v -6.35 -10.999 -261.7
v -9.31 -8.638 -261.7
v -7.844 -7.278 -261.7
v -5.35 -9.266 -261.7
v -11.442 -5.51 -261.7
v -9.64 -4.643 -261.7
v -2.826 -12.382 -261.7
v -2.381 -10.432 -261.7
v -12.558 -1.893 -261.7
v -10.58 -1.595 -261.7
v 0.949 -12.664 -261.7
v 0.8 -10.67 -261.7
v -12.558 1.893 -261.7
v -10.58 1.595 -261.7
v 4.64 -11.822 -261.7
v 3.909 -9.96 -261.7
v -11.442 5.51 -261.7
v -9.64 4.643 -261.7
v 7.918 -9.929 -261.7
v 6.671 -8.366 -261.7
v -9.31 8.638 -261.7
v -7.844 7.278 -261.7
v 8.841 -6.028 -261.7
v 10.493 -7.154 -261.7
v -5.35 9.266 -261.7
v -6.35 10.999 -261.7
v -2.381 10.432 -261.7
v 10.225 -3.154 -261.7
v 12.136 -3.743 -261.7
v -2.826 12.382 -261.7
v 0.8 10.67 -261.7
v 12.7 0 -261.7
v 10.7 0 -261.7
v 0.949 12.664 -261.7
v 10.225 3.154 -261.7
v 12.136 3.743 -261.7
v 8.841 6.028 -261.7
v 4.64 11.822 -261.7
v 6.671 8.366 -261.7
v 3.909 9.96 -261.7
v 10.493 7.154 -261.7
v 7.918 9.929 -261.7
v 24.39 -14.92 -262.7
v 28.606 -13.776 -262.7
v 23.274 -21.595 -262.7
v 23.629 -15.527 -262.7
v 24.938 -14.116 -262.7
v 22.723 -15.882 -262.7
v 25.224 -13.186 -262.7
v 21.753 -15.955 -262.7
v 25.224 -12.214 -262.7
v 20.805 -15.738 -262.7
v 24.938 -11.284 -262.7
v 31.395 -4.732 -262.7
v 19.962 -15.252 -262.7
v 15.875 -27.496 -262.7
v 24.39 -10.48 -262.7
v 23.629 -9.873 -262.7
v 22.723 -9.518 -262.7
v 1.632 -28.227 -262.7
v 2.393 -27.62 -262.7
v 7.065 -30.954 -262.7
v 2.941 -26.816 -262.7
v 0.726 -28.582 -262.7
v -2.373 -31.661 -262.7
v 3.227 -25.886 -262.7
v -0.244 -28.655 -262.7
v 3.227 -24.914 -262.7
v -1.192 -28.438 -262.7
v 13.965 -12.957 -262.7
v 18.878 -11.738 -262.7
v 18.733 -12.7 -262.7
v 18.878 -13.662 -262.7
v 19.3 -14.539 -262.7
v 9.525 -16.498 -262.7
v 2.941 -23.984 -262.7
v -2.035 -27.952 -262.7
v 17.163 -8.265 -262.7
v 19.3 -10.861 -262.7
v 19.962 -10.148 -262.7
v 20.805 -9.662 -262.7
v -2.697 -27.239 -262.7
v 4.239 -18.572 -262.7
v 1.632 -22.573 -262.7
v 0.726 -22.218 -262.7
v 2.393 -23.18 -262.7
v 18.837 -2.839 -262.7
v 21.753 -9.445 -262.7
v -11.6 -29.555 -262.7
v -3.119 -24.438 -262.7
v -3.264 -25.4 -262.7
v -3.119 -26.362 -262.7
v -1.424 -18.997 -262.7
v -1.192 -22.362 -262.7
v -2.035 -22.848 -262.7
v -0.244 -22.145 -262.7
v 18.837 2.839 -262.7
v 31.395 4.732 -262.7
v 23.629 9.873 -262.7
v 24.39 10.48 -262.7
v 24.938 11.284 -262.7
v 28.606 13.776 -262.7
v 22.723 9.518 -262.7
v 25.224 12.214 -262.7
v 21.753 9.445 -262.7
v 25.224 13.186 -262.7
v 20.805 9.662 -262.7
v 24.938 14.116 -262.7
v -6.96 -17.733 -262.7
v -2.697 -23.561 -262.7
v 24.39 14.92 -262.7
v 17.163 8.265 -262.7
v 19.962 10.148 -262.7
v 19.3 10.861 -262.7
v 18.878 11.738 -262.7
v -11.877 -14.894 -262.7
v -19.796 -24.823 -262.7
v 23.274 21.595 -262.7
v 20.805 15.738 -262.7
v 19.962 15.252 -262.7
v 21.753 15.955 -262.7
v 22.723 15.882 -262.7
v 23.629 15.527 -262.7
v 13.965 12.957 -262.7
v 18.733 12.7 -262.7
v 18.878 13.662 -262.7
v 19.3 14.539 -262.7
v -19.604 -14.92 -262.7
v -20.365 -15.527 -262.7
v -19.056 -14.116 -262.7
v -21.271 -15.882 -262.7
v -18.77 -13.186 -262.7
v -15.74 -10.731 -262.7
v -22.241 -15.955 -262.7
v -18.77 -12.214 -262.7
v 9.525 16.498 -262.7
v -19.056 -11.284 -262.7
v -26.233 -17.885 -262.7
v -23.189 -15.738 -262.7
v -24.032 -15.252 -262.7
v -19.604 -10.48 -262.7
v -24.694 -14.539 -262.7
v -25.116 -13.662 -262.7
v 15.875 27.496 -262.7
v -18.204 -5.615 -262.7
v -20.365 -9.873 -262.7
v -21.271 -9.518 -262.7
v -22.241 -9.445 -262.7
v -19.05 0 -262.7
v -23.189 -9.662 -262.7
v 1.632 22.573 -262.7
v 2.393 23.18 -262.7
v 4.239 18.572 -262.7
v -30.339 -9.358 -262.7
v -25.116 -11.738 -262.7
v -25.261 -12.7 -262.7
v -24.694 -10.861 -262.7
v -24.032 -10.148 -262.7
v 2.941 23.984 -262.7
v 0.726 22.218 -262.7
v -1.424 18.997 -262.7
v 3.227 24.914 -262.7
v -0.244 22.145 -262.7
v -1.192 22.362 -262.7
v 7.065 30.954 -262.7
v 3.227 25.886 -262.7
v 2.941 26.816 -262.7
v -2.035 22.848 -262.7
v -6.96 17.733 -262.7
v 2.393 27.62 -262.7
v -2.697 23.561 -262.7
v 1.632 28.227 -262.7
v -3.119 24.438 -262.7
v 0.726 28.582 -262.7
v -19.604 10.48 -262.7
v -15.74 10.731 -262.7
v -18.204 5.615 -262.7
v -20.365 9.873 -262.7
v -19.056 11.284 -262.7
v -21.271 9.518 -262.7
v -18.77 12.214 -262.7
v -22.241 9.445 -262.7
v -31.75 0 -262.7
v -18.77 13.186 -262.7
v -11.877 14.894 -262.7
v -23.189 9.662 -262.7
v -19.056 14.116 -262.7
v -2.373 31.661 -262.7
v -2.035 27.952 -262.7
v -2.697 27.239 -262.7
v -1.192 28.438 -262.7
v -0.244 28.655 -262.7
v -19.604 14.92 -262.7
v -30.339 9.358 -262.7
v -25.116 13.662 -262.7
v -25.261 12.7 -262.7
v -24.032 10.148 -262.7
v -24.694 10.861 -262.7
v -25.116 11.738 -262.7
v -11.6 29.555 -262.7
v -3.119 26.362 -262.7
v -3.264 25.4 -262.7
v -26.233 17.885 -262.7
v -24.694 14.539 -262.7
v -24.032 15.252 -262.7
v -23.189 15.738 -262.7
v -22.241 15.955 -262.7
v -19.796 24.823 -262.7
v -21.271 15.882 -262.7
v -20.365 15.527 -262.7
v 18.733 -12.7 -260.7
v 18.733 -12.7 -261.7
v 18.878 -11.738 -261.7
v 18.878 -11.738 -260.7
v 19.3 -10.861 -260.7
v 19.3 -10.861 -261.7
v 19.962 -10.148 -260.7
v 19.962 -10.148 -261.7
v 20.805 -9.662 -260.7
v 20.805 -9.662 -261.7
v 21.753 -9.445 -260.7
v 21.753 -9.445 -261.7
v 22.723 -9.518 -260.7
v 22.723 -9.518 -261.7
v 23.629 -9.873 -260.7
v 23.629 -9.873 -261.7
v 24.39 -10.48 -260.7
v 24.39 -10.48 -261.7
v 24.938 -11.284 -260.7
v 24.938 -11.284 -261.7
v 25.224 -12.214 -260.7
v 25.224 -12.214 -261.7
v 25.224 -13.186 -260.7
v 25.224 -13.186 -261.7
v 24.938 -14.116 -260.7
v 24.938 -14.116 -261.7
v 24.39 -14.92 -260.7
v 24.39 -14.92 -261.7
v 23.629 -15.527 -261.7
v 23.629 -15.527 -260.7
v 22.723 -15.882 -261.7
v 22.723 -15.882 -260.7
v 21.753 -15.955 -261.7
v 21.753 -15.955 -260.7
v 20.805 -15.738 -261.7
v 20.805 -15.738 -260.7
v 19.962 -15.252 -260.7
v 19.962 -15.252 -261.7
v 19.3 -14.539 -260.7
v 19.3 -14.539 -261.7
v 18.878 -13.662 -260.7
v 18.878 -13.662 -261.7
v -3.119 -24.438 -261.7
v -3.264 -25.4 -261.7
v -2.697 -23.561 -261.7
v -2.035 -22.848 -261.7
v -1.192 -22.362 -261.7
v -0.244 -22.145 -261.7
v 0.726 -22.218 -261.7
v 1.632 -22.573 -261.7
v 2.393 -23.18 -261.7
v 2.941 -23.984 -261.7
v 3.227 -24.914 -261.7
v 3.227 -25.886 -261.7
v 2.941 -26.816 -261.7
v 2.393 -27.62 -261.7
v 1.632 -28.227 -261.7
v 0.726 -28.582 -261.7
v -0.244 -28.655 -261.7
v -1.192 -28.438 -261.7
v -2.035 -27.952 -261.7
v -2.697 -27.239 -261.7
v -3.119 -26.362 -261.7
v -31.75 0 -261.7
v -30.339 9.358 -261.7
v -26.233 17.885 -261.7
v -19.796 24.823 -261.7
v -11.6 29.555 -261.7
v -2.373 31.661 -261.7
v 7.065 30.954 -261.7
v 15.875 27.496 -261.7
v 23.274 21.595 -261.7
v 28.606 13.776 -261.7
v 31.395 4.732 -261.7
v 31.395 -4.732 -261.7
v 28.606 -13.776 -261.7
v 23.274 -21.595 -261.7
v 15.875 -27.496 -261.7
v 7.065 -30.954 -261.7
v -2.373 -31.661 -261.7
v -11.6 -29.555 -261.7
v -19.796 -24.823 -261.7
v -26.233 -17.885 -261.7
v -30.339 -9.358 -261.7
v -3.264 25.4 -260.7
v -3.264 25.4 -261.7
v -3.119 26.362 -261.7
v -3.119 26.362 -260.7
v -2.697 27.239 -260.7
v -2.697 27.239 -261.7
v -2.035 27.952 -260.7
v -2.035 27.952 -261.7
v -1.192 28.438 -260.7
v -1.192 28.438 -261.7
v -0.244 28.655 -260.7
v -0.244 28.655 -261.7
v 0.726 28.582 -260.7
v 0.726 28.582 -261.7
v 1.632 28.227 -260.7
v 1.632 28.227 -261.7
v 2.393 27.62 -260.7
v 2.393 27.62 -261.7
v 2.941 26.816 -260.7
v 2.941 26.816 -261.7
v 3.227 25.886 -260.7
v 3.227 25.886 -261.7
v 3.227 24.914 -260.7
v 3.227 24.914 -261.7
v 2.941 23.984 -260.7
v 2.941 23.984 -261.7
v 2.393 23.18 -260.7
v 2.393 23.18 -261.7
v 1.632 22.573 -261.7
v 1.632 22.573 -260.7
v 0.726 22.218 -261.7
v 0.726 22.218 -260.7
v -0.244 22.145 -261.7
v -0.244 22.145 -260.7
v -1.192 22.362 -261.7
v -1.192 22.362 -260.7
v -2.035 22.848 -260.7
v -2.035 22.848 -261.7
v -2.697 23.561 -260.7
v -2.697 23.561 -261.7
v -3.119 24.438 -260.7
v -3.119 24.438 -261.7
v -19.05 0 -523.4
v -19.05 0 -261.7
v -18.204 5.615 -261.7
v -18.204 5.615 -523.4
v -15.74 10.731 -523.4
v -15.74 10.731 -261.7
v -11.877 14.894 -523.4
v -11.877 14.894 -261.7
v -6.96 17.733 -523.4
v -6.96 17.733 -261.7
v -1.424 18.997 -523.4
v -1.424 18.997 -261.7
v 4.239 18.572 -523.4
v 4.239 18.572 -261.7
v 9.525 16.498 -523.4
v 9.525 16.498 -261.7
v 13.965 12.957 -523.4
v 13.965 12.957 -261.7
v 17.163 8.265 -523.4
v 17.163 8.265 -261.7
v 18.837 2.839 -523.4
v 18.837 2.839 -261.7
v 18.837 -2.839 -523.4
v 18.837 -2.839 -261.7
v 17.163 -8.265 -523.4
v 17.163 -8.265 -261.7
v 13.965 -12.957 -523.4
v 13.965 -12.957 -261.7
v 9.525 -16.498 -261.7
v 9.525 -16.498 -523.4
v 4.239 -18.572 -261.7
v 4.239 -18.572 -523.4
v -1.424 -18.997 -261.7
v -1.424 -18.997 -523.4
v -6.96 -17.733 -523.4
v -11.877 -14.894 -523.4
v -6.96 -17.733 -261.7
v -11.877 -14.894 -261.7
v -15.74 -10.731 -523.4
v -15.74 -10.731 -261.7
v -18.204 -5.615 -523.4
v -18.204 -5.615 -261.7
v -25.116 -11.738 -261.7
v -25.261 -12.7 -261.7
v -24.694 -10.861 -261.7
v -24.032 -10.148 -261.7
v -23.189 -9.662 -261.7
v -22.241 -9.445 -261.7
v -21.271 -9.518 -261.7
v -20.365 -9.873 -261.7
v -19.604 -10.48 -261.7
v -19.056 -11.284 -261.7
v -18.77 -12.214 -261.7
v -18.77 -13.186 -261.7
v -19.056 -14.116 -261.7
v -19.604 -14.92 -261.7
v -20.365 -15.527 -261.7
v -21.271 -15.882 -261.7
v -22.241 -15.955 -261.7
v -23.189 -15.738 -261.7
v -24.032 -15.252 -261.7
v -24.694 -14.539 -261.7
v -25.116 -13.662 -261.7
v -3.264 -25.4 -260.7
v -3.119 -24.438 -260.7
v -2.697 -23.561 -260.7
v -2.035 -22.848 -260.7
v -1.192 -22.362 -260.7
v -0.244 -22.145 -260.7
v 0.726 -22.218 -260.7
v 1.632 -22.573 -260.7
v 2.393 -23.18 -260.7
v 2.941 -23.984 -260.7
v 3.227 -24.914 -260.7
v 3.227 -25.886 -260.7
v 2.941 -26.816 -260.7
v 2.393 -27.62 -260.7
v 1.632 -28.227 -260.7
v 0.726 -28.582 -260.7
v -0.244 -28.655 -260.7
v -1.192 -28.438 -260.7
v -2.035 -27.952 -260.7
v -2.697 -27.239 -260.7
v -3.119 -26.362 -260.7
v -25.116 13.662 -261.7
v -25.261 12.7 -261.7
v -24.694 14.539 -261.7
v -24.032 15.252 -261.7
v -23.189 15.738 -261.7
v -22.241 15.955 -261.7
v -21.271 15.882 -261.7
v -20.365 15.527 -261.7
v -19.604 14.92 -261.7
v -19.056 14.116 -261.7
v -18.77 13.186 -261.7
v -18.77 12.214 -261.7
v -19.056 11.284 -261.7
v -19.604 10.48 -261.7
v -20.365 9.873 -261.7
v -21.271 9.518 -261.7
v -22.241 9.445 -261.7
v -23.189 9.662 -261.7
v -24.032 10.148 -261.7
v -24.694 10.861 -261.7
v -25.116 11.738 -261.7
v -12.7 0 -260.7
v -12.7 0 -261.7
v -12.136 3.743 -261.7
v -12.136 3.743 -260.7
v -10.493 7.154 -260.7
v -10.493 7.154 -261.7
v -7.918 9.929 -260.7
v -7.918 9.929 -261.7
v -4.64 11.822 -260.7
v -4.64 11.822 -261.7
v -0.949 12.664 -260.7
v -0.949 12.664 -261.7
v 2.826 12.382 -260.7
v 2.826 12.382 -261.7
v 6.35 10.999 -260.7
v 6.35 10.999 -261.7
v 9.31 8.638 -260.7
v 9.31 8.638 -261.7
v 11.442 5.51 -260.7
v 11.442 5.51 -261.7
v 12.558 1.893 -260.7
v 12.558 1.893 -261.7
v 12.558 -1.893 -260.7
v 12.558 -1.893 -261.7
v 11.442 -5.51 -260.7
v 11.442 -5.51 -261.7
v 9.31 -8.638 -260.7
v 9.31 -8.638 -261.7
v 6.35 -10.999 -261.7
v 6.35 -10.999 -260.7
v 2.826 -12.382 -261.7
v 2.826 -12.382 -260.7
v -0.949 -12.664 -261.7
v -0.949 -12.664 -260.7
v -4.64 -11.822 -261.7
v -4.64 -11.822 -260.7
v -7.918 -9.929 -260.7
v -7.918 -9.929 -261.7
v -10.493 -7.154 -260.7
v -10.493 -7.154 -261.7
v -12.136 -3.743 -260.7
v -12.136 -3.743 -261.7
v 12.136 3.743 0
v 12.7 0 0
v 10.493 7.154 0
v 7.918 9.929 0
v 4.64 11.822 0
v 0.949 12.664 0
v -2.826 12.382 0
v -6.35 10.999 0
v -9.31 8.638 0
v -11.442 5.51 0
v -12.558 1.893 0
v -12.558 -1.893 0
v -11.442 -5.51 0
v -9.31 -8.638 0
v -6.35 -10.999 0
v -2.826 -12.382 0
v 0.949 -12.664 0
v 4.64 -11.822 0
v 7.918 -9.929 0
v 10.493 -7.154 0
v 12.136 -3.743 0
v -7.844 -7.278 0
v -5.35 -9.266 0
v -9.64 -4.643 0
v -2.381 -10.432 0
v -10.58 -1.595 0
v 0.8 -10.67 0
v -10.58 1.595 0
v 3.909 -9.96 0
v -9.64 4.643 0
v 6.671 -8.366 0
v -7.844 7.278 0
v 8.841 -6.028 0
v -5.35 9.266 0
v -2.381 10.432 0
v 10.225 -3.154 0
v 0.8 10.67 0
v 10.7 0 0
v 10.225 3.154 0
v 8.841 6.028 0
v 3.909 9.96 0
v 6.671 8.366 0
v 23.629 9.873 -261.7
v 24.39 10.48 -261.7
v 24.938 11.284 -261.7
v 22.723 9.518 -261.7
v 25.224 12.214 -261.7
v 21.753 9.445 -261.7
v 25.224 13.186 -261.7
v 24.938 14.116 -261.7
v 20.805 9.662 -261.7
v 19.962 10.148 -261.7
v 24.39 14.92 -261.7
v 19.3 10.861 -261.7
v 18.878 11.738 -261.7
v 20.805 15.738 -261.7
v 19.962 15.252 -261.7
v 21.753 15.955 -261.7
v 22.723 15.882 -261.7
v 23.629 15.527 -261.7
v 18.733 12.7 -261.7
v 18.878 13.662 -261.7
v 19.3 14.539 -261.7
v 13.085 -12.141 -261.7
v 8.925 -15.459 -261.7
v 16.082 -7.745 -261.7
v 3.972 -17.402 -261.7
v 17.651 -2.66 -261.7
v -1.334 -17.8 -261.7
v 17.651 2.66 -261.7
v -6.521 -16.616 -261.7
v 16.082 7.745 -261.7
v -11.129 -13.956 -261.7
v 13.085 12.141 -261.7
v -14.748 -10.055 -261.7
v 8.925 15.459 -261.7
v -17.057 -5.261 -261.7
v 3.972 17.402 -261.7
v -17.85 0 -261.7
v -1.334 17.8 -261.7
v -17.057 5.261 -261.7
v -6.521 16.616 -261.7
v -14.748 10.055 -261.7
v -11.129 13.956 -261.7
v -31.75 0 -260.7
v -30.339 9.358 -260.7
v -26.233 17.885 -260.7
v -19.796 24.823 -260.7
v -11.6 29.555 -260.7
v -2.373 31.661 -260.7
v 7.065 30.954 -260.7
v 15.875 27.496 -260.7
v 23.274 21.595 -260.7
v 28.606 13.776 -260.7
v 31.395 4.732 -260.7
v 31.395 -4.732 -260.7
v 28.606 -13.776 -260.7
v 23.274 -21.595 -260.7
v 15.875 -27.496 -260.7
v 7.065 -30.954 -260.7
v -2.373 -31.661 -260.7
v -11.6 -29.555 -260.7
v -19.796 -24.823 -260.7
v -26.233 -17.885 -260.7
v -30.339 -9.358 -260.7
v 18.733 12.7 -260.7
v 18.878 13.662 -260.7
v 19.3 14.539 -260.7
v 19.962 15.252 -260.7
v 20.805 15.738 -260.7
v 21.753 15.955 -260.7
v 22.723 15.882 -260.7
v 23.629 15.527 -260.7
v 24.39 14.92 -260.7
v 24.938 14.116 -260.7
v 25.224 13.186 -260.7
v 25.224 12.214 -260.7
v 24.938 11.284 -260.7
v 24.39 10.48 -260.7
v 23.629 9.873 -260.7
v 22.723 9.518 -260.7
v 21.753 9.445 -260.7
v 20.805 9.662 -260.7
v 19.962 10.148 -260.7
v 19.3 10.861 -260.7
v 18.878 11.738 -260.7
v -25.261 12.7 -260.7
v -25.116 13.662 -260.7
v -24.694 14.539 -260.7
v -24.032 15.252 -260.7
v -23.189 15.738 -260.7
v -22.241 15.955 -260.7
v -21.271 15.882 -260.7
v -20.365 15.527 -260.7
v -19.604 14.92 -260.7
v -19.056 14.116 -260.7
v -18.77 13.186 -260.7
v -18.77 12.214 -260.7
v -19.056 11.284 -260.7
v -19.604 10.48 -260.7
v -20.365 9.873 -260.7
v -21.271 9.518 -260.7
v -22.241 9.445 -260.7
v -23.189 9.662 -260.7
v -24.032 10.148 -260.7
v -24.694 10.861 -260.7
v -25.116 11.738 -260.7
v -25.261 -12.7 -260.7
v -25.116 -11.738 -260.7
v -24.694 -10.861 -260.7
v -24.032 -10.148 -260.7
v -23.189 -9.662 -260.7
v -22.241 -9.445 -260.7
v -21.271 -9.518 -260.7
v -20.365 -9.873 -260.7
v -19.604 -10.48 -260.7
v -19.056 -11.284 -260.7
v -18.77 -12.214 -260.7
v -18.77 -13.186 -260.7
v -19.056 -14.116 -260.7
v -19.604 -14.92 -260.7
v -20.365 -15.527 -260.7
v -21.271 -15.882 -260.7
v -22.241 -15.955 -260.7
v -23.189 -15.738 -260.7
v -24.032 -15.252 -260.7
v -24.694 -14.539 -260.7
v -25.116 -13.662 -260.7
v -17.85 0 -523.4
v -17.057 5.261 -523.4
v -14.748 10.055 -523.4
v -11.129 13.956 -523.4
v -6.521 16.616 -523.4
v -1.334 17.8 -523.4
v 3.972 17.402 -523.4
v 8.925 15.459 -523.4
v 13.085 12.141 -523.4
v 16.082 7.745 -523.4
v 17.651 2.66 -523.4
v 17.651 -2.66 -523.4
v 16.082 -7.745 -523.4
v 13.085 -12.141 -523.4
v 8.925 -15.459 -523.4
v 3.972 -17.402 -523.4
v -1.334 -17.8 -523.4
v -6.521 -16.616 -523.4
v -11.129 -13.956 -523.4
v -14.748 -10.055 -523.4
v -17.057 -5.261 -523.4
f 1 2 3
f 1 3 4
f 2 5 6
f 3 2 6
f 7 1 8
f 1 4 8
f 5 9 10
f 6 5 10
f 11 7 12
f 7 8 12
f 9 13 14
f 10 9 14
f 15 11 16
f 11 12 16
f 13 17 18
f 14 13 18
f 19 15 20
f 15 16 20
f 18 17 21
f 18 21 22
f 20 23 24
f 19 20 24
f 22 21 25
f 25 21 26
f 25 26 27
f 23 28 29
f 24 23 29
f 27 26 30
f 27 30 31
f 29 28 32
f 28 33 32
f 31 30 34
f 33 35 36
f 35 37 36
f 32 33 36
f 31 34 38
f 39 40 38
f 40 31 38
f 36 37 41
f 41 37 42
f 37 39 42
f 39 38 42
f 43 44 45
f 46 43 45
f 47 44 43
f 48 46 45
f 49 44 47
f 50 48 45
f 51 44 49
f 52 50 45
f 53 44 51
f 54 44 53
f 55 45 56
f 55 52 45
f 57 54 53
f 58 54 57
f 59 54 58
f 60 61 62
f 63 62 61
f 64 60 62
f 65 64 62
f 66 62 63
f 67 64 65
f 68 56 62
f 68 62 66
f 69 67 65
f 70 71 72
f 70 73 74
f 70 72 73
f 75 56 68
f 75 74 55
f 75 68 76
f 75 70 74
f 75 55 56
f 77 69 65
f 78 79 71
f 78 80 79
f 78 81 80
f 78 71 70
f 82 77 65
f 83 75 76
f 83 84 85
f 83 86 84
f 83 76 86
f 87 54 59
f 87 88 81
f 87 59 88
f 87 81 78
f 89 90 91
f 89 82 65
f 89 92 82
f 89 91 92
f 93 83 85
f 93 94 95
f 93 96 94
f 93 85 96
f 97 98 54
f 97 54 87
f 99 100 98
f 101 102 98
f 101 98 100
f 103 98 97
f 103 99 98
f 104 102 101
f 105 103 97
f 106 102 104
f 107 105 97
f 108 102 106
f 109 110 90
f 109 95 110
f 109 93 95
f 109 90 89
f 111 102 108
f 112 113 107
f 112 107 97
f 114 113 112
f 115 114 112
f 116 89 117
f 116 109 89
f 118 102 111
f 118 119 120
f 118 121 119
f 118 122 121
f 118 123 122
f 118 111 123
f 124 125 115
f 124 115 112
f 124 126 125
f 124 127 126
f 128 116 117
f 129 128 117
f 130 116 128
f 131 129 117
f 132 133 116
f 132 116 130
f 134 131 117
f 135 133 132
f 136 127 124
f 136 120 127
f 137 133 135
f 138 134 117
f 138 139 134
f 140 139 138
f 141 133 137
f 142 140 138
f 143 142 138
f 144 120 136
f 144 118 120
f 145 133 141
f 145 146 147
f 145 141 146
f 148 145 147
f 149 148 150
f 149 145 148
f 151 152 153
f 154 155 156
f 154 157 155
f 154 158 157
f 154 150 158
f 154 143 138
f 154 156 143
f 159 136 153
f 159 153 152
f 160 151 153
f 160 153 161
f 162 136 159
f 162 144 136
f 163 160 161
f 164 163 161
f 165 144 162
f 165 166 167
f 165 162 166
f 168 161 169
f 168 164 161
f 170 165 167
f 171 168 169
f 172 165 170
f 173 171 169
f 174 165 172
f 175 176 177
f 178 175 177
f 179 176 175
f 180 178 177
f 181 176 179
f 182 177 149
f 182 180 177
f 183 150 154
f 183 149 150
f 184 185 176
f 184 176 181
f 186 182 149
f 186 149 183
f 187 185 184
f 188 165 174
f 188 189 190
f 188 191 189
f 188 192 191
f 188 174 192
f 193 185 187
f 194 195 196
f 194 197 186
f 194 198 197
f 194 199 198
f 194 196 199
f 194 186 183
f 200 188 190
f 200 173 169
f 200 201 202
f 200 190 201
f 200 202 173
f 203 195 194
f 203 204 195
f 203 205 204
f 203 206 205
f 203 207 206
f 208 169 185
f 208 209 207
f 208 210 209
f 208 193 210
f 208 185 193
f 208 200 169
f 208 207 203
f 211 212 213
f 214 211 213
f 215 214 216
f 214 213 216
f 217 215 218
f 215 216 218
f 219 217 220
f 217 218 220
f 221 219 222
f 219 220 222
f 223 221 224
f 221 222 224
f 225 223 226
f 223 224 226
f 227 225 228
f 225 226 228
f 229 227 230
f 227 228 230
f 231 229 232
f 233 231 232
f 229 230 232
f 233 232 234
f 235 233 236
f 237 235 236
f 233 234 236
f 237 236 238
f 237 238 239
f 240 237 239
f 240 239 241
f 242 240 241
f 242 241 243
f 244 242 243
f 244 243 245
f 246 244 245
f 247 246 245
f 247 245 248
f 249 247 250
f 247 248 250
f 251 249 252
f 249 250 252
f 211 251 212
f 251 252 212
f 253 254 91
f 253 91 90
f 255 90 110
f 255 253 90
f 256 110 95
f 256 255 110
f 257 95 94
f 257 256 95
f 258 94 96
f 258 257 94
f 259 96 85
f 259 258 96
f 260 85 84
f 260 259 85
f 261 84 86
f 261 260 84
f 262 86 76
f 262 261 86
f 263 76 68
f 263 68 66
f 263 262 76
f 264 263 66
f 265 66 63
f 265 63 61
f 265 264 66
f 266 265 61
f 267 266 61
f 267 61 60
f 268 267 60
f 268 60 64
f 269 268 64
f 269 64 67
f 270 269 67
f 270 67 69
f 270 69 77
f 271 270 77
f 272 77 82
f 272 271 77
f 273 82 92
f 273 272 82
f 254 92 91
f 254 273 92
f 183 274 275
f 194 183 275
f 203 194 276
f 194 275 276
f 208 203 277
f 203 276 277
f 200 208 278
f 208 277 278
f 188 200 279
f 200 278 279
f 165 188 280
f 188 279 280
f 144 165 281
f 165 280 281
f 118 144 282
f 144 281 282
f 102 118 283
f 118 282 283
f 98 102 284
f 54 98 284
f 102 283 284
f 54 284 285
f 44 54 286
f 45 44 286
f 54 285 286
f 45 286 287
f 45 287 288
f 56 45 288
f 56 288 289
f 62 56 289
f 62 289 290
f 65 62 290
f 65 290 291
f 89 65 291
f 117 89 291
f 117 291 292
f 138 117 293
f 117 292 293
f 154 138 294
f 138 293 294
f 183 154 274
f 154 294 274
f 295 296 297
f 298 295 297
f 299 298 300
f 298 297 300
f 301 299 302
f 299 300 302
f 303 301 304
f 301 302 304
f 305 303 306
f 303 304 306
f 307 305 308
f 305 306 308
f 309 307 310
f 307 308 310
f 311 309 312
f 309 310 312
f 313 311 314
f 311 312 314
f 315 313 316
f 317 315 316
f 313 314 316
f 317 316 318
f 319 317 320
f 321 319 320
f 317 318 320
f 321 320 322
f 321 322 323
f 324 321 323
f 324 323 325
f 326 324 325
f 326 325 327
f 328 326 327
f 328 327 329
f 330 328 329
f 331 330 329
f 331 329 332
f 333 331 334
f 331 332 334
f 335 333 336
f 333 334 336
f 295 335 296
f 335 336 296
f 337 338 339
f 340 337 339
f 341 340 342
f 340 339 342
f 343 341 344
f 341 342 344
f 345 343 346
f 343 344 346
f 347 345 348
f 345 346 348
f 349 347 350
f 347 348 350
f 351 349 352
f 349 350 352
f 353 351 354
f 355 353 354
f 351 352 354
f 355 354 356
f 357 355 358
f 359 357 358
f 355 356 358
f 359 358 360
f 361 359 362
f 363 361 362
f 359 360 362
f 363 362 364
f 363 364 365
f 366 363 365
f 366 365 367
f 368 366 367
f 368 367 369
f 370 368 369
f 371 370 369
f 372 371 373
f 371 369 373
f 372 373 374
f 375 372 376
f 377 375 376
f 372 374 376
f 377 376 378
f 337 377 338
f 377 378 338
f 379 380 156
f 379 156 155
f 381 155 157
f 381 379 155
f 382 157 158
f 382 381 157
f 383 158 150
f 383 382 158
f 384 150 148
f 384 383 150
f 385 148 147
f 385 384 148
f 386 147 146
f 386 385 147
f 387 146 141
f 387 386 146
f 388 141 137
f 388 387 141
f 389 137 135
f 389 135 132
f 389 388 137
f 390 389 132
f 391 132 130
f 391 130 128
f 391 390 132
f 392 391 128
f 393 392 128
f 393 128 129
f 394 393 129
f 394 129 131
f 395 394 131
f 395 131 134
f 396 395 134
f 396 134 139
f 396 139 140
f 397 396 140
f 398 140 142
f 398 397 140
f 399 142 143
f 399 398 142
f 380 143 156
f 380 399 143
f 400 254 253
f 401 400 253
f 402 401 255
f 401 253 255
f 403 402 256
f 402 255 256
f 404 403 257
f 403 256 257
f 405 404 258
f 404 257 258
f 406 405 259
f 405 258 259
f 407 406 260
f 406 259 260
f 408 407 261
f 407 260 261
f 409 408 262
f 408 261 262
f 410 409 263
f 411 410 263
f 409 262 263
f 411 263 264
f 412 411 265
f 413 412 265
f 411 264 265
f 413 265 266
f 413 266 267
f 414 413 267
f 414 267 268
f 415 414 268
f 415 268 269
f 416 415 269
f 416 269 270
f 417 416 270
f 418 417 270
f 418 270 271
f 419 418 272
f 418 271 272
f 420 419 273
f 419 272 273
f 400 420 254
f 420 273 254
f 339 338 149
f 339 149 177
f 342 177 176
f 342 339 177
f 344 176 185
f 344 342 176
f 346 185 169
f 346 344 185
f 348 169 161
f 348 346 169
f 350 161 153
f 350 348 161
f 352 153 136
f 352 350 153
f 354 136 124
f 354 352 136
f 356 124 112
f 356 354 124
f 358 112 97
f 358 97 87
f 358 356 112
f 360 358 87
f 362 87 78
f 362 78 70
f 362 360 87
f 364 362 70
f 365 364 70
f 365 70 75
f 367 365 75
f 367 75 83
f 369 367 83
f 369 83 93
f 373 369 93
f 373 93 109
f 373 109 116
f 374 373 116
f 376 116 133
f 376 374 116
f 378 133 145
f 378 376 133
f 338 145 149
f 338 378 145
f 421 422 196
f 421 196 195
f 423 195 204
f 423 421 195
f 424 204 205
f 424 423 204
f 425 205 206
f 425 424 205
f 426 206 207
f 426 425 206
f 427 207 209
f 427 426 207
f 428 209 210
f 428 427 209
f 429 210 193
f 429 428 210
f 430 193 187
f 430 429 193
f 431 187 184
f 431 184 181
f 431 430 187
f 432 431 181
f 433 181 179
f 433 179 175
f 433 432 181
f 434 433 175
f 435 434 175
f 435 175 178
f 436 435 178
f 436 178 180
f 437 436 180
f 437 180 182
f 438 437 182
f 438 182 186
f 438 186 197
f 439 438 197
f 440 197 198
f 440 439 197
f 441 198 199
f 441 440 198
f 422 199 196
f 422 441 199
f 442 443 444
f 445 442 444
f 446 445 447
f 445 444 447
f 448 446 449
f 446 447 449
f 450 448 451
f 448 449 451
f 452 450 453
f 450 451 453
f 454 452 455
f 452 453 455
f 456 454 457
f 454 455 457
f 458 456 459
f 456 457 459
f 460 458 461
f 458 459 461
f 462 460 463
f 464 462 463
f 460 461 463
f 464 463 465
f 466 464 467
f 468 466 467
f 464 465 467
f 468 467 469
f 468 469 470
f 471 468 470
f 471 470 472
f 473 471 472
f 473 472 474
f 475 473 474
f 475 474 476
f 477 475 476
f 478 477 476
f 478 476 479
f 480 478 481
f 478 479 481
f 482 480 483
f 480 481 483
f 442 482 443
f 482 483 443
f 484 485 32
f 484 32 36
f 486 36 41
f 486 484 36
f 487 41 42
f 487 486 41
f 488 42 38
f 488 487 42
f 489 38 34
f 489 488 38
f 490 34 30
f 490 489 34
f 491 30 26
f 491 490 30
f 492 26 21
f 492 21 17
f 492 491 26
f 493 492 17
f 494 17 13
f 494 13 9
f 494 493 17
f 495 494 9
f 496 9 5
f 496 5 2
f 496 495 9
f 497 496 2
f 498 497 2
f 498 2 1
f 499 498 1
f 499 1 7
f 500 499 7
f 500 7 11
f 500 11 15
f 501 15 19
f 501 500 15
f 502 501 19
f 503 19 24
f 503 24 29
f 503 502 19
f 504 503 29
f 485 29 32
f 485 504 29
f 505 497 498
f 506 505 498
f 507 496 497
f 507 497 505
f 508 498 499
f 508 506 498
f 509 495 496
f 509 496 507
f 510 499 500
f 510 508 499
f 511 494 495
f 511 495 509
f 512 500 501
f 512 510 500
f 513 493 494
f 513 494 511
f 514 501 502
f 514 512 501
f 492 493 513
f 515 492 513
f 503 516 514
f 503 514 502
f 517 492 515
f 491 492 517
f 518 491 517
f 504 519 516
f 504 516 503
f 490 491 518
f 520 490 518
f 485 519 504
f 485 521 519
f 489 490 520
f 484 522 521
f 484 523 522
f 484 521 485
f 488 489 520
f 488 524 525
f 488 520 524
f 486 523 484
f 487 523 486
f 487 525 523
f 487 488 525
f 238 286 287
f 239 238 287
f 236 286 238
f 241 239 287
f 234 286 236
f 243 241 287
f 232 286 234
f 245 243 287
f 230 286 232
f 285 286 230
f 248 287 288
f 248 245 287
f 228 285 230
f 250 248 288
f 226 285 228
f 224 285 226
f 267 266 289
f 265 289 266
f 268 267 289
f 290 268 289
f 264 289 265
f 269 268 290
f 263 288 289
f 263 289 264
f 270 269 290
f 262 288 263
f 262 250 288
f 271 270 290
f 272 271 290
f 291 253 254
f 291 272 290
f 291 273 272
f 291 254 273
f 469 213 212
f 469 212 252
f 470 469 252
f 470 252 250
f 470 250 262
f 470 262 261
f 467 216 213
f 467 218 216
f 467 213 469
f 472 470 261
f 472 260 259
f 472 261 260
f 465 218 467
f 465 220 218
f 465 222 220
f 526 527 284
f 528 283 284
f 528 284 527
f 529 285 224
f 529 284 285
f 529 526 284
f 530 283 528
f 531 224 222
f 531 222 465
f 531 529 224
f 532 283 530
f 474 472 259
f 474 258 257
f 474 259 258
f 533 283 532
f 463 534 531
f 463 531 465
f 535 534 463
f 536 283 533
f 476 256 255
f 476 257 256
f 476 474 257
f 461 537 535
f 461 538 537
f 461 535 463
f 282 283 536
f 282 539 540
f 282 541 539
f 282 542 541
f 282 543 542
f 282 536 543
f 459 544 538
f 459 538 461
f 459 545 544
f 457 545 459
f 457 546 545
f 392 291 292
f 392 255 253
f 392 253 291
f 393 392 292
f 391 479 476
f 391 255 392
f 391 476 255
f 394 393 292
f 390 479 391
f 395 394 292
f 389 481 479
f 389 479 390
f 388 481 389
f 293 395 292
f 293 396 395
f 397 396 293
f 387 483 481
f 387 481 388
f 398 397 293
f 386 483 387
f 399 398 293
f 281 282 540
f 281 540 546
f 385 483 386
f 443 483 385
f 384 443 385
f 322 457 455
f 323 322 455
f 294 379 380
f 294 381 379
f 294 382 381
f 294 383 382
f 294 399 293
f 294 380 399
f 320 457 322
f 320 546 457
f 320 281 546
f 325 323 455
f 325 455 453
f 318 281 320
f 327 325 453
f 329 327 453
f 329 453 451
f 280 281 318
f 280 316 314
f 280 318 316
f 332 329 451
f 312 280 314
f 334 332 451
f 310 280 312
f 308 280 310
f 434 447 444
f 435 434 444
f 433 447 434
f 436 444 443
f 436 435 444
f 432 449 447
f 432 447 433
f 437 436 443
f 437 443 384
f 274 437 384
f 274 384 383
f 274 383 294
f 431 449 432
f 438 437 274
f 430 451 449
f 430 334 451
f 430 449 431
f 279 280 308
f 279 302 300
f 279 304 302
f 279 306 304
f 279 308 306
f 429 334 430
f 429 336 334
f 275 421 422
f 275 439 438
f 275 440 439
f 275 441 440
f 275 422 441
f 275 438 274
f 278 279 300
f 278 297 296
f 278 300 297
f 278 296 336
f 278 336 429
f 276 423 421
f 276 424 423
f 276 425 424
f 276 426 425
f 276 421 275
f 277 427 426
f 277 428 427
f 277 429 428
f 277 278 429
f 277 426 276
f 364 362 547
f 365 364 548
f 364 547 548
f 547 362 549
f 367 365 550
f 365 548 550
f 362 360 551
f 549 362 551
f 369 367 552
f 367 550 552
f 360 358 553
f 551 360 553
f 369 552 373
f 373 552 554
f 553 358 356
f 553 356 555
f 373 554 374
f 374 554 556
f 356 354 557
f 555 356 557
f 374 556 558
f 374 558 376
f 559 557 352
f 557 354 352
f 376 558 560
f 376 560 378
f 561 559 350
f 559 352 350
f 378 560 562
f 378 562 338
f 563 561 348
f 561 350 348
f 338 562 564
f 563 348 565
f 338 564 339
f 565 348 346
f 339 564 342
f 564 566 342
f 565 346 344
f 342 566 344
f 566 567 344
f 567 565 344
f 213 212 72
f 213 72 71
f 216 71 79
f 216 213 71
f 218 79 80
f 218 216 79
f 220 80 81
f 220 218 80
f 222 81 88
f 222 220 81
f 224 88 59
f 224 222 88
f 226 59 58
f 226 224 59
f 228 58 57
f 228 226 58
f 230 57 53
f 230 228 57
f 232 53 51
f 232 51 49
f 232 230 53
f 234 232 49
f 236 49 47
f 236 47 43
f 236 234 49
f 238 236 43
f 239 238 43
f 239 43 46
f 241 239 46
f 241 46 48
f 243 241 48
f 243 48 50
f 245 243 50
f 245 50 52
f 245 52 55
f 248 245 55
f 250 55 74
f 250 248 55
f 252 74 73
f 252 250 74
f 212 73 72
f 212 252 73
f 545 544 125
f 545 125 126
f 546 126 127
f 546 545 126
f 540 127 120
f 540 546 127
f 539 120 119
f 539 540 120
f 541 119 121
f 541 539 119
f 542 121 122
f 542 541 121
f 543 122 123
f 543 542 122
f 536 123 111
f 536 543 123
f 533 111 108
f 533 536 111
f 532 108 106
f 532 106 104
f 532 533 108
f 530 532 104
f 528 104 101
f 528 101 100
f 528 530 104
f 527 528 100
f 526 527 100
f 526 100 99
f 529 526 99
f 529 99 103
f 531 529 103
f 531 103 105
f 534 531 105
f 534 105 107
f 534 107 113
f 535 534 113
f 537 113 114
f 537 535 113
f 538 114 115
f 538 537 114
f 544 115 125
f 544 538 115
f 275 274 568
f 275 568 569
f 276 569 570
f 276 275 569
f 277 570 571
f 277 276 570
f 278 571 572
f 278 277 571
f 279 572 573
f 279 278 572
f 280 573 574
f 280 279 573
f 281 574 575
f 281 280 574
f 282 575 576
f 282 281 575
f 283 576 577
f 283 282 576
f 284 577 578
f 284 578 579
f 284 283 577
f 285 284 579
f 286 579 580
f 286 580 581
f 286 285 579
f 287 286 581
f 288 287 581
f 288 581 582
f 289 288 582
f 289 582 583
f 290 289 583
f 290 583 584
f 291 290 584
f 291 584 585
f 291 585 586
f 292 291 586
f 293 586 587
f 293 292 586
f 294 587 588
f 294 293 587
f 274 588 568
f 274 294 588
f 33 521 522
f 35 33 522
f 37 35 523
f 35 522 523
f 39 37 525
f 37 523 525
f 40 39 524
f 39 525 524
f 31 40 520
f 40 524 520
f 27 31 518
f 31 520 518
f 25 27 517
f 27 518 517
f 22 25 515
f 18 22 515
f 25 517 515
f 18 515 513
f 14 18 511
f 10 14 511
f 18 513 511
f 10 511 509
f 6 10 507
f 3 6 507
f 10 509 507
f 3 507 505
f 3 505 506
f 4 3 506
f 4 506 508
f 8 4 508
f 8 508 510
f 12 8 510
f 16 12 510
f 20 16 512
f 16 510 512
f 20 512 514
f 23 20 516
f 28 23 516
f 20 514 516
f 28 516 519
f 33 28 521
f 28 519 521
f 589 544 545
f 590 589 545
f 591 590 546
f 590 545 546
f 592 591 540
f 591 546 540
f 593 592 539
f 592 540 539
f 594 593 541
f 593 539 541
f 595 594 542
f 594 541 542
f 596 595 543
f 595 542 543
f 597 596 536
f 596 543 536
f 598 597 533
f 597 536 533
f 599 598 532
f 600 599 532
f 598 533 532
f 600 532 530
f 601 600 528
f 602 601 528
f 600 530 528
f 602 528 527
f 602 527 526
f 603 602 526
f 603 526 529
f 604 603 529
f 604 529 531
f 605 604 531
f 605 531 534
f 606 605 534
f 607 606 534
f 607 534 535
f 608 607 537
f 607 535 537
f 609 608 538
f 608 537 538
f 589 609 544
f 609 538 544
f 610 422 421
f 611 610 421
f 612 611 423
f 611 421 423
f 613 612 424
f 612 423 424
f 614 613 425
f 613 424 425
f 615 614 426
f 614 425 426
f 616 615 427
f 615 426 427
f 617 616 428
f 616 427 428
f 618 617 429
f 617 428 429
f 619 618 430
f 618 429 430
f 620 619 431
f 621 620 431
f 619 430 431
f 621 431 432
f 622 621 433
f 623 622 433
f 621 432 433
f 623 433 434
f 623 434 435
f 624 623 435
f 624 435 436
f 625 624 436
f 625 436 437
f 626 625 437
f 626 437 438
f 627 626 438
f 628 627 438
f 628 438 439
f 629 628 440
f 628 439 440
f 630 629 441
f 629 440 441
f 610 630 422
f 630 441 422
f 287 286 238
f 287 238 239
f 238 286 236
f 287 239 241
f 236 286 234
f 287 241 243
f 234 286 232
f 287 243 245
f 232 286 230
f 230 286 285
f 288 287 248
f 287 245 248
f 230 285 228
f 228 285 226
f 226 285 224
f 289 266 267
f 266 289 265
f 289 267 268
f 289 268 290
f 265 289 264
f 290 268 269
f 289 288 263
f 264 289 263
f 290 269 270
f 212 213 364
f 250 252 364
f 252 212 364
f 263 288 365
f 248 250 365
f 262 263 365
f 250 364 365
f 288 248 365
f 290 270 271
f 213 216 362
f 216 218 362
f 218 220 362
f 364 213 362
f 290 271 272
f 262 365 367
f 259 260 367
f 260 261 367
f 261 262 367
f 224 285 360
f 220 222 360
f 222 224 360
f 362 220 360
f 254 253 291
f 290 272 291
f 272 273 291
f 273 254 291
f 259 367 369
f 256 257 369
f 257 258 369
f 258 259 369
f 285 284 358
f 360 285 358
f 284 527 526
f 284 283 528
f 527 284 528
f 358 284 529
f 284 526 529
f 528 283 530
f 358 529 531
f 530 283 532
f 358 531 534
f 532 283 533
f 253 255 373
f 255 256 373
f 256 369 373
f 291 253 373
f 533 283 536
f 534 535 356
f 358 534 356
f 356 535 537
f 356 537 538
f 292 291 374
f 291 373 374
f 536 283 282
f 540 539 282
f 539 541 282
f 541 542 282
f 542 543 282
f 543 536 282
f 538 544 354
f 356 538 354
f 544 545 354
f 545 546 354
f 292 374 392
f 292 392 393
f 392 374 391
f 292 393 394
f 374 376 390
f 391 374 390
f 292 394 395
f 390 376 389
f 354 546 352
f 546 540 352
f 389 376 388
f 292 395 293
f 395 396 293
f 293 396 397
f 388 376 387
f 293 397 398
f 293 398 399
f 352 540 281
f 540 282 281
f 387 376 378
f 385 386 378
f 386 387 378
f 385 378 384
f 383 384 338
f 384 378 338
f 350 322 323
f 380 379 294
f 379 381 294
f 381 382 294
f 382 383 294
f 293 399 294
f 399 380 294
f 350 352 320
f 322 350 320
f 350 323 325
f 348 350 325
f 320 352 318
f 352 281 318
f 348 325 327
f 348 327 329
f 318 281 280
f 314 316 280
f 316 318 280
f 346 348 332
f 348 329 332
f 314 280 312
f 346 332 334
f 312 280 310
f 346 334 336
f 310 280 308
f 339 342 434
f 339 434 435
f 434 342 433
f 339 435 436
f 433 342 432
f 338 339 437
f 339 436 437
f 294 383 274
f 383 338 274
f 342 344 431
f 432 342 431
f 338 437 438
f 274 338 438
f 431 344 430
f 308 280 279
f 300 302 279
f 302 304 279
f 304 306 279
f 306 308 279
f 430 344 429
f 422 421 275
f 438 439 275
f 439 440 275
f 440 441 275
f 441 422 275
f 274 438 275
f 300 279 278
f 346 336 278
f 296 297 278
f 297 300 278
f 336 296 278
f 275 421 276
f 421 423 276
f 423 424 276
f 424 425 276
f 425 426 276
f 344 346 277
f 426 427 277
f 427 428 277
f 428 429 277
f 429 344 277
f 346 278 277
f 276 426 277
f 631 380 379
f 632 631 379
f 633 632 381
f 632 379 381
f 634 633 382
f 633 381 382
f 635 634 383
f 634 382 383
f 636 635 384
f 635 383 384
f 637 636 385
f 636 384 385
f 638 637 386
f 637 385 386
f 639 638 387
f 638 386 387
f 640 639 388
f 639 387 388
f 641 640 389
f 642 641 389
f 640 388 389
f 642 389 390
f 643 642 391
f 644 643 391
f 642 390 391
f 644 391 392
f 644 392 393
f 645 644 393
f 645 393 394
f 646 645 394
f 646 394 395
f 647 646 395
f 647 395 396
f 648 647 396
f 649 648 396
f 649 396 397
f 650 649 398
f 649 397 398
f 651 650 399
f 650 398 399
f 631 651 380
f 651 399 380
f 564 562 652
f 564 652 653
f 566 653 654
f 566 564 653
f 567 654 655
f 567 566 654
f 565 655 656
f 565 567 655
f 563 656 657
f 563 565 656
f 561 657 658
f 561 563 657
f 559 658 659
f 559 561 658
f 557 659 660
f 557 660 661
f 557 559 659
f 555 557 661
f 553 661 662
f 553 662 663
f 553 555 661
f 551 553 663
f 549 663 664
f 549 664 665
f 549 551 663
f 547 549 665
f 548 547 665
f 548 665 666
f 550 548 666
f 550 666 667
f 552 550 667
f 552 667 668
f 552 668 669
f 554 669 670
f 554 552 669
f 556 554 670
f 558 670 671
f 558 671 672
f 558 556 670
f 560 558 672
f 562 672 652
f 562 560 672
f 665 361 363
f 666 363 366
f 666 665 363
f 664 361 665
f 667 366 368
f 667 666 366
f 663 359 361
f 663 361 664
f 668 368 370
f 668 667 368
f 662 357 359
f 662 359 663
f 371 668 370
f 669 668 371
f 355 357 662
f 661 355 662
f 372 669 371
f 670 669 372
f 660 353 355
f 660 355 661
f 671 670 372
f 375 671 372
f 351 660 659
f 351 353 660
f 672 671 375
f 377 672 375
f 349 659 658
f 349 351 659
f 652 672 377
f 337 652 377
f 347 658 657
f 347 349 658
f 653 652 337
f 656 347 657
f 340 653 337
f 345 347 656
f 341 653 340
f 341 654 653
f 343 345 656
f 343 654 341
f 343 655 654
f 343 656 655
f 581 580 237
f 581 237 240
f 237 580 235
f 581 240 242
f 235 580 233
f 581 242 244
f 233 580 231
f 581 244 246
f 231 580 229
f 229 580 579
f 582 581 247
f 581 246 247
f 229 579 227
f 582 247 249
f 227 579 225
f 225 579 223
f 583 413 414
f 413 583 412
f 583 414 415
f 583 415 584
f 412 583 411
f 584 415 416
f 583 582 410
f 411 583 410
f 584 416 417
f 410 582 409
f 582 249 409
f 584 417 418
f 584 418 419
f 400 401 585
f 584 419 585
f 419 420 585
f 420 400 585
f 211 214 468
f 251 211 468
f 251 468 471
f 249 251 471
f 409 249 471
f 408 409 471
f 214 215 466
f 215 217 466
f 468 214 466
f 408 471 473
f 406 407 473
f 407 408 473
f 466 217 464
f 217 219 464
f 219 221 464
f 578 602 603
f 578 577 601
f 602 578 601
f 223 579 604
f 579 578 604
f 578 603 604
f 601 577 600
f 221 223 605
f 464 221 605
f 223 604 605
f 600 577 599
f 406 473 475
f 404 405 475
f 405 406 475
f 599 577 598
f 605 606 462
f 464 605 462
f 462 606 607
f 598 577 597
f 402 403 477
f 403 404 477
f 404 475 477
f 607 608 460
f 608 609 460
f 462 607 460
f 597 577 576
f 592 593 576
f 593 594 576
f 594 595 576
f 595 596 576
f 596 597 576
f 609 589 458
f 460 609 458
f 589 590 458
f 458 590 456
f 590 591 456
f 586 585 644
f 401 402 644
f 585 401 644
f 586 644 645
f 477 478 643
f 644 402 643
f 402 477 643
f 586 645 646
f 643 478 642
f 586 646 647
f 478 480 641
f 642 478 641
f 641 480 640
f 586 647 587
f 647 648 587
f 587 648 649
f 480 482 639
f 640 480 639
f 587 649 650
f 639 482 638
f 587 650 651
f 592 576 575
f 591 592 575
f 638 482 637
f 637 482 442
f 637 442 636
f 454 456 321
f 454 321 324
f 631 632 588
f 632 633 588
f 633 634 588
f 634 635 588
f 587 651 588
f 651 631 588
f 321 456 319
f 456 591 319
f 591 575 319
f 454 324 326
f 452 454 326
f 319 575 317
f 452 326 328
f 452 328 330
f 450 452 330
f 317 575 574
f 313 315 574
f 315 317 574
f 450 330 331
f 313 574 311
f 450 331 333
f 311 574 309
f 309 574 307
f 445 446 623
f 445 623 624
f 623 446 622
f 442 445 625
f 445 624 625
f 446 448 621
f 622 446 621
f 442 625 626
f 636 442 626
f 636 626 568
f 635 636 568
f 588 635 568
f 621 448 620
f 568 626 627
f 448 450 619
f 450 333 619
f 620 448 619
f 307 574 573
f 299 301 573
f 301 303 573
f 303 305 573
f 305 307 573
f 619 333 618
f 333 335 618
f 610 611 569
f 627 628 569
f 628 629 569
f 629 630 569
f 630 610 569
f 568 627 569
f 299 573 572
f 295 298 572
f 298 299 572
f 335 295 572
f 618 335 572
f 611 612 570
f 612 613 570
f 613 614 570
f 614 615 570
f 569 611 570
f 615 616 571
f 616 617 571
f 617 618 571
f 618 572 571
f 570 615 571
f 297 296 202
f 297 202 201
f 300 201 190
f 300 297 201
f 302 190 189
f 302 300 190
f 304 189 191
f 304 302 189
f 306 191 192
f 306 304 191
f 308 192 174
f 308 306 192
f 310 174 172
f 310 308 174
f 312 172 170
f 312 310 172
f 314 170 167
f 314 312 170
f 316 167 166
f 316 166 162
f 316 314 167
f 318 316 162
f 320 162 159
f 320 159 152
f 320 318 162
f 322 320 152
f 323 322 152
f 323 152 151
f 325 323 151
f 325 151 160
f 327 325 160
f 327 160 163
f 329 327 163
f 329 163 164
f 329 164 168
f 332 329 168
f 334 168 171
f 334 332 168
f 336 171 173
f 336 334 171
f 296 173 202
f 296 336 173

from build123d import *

# Parameters (mm, degrees)
SKETCH1_R                     = 12.7
SKETCH1_R_2                   = 10.7
BOSS_EXTRUDEINNERTUBE_DEPTH   = 261.7
SKETCH2_R                     = 31.75
SKETCH2_R_2                   = 12.7
SKETCH2_R_3                   = 3.2639
BOSS_EXTRUDEFRONTFLANGE_DEPTH = 1
SKETCH3_R                     = 19.05
SKETCH3_R_2                   = 17.85
BOSS_EXTRUDEOUTERTUBE_DEPTH   = 261.7
SKETCH4_R                     = 31.75
SKETCH4_R_2                   = 3.2639
SKETCH4_R_3                   = 19.05
BOSS_EXTRUDEREARFLANGE_DEPTH  = 1


with BuildPart() as part:
    # Sketch1 → Boss-ExtrudeInnerTube (new body)
    with BuildSketch(Plane.XY):
        Circle(SKETCH1_R)
        Circle(SKETCH1_R_2, mode=Mode.SUBTRACT)
    extrude(amount=-BOSS_EXTRUDEINNERTUBE_DEPTH)


with BuildPart() as body_2:
    # Sketch2 → Boss-ExtrudeFrontFlange (new body)
    with BuildSketch(Plane(origin=(0, 0, -261.7), x_dir=(-1, 0, 0), z_dir=(0, 0, -1))):
        Circle(SKETCH2_R)
        Circle(SKETCH2_R_2, mode=Mode.SUBTRACT)
        with Locations((0, 25.4)):
            Circle(SKETCH2_R_3, mode=Mode.SUBTRACT)
        with Locations((21.997045256, 12.7)):
            Circle(SKETCH2_R_3, mode=Mode.SUBTRACT)
        with Locations((21.997045256, -12.7)):
            Circle(SKETCH2_R_3, mode=Mode.SUBTRACT)
        with Locations((0, -25.4)):
            Circle(SKETCH2_R_3, mode=Mode.SUBTRACT)
        with Locations((-21.997045256, -12.7)):
            Circle(SKETCH2_R_3, mode=Mode.SUBTRACT)
        with Locations((-21.997045256, 12.7)):
            Circle(SKETCH2_R_3, mode=Mode.SUBTRACT)
    extrude(amount=-BOSS_EXTRUDEFRONTFLANGE_DEPTH)


with BuildPart() as body_3:
    # Sketch3 → Boss-ExtrudeOuterTube (new body)
    with BuildSketch(Plane(origin=(0, 0, -261.7), x_dir=(-1, 0, 0), z_dir=(0, 0, -1))):
        Circle(SKETCH3_R)
        Circle(SKETCH3_R_2, mode=Mode.SUBTRACT)
    extrude(amount=BOSS_EXTRUDEOUTERTUBE_DEPTH)


with BuildPart() as body_4:
    # Sketch4 → Boss-ExtrudeRearFlange (new body)
    with BuildSketch(Plane(origin=(0, 0, -261.7), x_dir=(-1, 0, 0), z_dir=(0, 0, -1))):
        Circle(SKETCH4_R)
        with Locations((-21.997045256, 12.7)):
            Circle(SKETCH4_R_2, mode=Mode.SUBTRACT)
        with Locations((0, 25.4)):
            Circle(SKETCH4_R_2, mode=Mode.SUBTRACT)
        with Locations((-21.997045256, -12.7)):
            Circle(SKETCH4_R_2, mode=Mode.SUBTRACT)
        with Locations((21.997045256, 12.7)):
            Circle(SKETCH4_R_2, mode=Mode.SUBTRACT)
        with Locations((21.997045256, -12.7)):
            Circle(SKETCH4_R_2, mode=Mode.SUBTRACT)
        with Locations((0, -25.4)):
            Circle(SKETCH4_R_2, mode=Mode.SUBTRACT)
        Circle(SKETCH4_R_3, mode=Mode.SUBTRACT)
    extrude(amount=BOSS_EXTRUDEREARFLANGE_DEPTH)


solid = Compound([part.part, body_2.part, body_3.part, body_4.part])
